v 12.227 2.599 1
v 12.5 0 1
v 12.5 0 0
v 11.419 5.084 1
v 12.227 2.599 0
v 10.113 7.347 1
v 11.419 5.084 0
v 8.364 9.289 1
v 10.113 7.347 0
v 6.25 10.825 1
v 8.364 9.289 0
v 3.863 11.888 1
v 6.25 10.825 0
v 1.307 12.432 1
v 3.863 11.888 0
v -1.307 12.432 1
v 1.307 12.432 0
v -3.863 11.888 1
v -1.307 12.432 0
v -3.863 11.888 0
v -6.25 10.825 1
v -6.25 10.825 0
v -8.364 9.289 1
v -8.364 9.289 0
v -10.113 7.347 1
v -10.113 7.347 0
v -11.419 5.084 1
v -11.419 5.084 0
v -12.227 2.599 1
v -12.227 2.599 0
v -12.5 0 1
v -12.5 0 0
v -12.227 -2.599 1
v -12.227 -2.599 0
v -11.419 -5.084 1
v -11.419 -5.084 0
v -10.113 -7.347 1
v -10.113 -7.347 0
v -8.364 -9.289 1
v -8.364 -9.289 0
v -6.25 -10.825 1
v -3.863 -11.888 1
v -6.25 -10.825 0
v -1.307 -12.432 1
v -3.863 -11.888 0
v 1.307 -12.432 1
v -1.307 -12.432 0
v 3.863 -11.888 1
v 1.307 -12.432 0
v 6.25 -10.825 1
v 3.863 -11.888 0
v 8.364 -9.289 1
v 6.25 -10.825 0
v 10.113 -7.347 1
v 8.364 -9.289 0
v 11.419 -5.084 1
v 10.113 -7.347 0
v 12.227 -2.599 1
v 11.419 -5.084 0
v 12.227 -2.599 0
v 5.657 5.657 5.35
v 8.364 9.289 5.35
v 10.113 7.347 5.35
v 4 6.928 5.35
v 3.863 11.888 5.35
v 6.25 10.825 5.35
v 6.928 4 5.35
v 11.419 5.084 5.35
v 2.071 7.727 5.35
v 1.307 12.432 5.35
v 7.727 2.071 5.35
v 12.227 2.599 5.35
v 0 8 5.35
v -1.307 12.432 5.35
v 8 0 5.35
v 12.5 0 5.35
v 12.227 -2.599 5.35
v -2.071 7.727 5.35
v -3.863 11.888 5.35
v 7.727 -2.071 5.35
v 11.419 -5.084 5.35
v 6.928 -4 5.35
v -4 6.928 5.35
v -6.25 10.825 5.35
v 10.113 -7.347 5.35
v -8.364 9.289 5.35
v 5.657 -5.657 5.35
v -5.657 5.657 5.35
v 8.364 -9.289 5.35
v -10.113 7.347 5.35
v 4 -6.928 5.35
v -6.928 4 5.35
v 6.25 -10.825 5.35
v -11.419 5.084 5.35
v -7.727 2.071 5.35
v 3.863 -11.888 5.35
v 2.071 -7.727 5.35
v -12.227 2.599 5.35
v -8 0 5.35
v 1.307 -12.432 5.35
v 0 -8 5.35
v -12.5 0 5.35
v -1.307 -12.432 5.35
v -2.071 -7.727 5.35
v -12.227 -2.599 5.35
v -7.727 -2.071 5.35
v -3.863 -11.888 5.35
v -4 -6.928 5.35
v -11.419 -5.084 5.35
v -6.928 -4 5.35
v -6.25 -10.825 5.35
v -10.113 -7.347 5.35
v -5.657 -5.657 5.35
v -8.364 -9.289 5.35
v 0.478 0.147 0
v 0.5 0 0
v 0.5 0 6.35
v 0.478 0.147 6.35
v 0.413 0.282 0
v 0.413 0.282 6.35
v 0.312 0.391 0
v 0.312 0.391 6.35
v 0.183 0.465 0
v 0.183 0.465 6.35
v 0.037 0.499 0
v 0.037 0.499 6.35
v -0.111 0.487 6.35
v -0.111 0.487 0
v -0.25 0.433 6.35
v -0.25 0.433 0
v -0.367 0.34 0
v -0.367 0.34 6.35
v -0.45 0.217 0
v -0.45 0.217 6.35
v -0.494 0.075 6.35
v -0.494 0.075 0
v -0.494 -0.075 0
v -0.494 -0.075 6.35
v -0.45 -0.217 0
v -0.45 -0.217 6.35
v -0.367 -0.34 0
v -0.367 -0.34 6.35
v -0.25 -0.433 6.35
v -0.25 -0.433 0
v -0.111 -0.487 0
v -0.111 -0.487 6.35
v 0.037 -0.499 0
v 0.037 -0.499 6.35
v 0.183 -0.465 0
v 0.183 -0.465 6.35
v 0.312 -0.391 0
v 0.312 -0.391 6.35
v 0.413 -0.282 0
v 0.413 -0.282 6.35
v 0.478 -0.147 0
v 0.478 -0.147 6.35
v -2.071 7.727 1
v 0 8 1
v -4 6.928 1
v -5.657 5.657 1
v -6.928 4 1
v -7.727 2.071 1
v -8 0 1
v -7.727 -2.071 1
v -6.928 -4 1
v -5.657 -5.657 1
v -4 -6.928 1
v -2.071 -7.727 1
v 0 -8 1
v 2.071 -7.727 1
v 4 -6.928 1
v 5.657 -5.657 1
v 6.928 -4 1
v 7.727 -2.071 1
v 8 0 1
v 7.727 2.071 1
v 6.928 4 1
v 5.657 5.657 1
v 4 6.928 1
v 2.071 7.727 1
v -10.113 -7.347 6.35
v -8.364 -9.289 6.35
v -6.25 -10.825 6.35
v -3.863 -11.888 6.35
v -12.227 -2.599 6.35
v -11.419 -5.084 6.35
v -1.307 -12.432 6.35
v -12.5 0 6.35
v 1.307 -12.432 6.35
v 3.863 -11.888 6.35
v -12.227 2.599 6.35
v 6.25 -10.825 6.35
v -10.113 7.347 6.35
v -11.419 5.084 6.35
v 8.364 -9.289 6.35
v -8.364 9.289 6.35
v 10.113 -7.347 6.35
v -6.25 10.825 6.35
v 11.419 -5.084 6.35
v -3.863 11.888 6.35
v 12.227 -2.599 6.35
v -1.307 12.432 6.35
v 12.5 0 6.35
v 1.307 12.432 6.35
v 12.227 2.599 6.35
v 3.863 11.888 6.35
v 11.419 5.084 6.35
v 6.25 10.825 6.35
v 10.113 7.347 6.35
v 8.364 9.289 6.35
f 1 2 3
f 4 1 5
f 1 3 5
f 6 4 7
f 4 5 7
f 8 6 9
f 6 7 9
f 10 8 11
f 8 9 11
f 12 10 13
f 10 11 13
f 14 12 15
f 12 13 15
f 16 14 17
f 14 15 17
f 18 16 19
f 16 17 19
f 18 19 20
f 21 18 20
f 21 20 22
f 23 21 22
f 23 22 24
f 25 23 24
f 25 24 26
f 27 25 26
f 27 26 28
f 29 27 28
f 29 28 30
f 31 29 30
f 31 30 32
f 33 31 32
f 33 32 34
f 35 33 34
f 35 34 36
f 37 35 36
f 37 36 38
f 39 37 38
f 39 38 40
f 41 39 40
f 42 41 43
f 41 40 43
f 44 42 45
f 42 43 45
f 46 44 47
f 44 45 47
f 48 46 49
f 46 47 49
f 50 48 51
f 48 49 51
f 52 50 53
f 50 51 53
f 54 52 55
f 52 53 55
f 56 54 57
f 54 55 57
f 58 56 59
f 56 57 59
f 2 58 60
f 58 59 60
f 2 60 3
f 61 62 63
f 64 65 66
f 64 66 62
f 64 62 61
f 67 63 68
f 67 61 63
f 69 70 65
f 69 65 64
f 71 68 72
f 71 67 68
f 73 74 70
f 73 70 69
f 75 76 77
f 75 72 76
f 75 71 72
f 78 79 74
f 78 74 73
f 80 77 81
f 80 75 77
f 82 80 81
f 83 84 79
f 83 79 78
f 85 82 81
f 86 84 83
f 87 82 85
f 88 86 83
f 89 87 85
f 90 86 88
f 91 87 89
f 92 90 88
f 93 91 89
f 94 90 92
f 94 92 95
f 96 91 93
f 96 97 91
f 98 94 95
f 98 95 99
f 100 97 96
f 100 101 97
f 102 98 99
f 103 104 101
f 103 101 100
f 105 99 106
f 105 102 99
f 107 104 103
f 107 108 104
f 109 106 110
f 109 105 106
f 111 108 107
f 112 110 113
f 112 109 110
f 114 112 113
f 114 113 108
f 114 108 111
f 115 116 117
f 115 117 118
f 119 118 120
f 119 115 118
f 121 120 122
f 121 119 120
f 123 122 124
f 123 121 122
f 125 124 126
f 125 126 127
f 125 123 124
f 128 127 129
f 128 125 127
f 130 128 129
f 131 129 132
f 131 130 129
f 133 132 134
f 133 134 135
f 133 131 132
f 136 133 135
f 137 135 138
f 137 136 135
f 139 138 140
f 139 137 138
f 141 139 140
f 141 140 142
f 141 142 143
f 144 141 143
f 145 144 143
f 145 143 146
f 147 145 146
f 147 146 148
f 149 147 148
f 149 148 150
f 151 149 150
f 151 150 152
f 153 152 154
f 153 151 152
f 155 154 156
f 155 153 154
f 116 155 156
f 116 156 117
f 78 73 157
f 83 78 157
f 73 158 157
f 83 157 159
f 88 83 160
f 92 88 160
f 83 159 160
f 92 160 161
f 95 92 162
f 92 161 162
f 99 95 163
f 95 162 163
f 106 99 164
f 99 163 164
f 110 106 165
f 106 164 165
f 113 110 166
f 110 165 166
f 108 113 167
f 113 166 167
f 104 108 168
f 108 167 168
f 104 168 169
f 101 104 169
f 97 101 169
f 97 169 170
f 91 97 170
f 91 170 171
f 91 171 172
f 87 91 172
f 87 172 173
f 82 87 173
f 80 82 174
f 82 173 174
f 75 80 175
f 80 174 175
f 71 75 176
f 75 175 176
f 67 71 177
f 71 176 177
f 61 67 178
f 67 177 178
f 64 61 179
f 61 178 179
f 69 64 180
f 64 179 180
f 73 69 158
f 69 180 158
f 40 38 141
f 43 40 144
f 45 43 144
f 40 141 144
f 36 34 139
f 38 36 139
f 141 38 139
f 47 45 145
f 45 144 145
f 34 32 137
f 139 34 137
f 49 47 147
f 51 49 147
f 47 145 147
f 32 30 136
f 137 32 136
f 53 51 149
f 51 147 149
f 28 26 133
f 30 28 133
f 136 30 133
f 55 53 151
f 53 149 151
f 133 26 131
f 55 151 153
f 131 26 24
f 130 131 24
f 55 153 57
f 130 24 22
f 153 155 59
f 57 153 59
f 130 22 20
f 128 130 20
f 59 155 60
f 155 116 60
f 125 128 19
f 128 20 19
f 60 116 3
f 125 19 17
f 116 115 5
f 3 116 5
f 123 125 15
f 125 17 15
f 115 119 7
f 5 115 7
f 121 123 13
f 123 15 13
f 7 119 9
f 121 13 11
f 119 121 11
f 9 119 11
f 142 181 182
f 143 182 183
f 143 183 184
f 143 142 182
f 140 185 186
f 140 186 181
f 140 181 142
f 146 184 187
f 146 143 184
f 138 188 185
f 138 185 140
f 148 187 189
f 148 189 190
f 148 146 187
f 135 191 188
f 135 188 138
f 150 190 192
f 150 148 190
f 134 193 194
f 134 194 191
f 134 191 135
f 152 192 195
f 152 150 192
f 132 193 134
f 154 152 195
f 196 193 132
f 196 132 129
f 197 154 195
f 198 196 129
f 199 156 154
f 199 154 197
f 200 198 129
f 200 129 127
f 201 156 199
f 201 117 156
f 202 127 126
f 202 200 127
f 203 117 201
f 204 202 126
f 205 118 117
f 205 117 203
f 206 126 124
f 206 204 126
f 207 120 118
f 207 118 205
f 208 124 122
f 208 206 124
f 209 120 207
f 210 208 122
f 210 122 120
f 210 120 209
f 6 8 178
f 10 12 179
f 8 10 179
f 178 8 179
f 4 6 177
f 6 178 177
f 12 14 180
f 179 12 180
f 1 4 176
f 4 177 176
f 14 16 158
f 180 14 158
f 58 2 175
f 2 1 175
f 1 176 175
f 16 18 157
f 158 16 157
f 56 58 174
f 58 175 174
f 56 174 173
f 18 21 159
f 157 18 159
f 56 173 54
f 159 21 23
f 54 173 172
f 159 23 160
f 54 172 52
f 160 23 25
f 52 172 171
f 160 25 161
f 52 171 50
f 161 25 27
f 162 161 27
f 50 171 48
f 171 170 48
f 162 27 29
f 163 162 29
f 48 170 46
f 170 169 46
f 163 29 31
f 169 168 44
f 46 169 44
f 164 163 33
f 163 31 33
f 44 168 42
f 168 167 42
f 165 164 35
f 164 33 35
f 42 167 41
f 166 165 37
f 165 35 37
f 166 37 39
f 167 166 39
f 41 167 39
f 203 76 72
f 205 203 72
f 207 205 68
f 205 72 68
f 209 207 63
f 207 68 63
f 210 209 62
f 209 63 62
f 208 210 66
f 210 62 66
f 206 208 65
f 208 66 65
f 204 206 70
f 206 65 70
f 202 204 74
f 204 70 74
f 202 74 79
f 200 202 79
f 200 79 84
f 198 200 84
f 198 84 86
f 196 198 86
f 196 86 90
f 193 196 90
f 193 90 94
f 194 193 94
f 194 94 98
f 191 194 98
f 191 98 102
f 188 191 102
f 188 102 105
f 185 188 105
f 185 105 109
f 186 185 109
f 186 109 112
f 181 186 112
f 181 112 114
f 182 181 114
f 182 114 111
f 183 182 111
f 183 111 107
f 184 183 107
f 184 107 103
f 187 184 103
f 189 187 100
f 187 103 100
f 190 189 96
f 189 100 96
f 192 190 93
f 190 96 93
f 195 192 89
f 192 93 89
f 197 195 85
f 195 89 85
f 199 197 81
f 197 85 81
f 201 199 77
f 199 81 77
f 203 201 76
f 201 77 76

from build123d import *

# Parameters (mm, degrees)
SKETCH1_R           = 12.5
SKETCH1_R_2         = 0.5
BOSS_EXTRUDE1_DEPTH = 6.35
SKETCH2_W           = 4.35
SKETCH2_H           = 4.5


with BuildPart() as part:
    # Sketch1 → Boss-Extrude1 (new body)
    with BuildSketch(Plane.XY):
        Circle(SKETCH1_R)
        Circle(SKETCH1_R_2, mode=Mode.SUBTRACT)
    extrude(amount=BOSS_EXTRUDE1_DEPTH)

    # Sketch2 → Cut-Revolve1 (revolve, cut)
    with BuildSketch(Plane(origin=(0, 0, 0), x_dir=(0, 0, -1), z_dir=(1, 0, 0))):
        with Locations((-3.175, 10.25)):
            Rectangle(SKETCH2_W, SKETCH2_H)
    revolve(axis=Axis((0, 0, 0), (0, 0, 1)), mode=Mode.SUBTRACT)


solid = part.part
